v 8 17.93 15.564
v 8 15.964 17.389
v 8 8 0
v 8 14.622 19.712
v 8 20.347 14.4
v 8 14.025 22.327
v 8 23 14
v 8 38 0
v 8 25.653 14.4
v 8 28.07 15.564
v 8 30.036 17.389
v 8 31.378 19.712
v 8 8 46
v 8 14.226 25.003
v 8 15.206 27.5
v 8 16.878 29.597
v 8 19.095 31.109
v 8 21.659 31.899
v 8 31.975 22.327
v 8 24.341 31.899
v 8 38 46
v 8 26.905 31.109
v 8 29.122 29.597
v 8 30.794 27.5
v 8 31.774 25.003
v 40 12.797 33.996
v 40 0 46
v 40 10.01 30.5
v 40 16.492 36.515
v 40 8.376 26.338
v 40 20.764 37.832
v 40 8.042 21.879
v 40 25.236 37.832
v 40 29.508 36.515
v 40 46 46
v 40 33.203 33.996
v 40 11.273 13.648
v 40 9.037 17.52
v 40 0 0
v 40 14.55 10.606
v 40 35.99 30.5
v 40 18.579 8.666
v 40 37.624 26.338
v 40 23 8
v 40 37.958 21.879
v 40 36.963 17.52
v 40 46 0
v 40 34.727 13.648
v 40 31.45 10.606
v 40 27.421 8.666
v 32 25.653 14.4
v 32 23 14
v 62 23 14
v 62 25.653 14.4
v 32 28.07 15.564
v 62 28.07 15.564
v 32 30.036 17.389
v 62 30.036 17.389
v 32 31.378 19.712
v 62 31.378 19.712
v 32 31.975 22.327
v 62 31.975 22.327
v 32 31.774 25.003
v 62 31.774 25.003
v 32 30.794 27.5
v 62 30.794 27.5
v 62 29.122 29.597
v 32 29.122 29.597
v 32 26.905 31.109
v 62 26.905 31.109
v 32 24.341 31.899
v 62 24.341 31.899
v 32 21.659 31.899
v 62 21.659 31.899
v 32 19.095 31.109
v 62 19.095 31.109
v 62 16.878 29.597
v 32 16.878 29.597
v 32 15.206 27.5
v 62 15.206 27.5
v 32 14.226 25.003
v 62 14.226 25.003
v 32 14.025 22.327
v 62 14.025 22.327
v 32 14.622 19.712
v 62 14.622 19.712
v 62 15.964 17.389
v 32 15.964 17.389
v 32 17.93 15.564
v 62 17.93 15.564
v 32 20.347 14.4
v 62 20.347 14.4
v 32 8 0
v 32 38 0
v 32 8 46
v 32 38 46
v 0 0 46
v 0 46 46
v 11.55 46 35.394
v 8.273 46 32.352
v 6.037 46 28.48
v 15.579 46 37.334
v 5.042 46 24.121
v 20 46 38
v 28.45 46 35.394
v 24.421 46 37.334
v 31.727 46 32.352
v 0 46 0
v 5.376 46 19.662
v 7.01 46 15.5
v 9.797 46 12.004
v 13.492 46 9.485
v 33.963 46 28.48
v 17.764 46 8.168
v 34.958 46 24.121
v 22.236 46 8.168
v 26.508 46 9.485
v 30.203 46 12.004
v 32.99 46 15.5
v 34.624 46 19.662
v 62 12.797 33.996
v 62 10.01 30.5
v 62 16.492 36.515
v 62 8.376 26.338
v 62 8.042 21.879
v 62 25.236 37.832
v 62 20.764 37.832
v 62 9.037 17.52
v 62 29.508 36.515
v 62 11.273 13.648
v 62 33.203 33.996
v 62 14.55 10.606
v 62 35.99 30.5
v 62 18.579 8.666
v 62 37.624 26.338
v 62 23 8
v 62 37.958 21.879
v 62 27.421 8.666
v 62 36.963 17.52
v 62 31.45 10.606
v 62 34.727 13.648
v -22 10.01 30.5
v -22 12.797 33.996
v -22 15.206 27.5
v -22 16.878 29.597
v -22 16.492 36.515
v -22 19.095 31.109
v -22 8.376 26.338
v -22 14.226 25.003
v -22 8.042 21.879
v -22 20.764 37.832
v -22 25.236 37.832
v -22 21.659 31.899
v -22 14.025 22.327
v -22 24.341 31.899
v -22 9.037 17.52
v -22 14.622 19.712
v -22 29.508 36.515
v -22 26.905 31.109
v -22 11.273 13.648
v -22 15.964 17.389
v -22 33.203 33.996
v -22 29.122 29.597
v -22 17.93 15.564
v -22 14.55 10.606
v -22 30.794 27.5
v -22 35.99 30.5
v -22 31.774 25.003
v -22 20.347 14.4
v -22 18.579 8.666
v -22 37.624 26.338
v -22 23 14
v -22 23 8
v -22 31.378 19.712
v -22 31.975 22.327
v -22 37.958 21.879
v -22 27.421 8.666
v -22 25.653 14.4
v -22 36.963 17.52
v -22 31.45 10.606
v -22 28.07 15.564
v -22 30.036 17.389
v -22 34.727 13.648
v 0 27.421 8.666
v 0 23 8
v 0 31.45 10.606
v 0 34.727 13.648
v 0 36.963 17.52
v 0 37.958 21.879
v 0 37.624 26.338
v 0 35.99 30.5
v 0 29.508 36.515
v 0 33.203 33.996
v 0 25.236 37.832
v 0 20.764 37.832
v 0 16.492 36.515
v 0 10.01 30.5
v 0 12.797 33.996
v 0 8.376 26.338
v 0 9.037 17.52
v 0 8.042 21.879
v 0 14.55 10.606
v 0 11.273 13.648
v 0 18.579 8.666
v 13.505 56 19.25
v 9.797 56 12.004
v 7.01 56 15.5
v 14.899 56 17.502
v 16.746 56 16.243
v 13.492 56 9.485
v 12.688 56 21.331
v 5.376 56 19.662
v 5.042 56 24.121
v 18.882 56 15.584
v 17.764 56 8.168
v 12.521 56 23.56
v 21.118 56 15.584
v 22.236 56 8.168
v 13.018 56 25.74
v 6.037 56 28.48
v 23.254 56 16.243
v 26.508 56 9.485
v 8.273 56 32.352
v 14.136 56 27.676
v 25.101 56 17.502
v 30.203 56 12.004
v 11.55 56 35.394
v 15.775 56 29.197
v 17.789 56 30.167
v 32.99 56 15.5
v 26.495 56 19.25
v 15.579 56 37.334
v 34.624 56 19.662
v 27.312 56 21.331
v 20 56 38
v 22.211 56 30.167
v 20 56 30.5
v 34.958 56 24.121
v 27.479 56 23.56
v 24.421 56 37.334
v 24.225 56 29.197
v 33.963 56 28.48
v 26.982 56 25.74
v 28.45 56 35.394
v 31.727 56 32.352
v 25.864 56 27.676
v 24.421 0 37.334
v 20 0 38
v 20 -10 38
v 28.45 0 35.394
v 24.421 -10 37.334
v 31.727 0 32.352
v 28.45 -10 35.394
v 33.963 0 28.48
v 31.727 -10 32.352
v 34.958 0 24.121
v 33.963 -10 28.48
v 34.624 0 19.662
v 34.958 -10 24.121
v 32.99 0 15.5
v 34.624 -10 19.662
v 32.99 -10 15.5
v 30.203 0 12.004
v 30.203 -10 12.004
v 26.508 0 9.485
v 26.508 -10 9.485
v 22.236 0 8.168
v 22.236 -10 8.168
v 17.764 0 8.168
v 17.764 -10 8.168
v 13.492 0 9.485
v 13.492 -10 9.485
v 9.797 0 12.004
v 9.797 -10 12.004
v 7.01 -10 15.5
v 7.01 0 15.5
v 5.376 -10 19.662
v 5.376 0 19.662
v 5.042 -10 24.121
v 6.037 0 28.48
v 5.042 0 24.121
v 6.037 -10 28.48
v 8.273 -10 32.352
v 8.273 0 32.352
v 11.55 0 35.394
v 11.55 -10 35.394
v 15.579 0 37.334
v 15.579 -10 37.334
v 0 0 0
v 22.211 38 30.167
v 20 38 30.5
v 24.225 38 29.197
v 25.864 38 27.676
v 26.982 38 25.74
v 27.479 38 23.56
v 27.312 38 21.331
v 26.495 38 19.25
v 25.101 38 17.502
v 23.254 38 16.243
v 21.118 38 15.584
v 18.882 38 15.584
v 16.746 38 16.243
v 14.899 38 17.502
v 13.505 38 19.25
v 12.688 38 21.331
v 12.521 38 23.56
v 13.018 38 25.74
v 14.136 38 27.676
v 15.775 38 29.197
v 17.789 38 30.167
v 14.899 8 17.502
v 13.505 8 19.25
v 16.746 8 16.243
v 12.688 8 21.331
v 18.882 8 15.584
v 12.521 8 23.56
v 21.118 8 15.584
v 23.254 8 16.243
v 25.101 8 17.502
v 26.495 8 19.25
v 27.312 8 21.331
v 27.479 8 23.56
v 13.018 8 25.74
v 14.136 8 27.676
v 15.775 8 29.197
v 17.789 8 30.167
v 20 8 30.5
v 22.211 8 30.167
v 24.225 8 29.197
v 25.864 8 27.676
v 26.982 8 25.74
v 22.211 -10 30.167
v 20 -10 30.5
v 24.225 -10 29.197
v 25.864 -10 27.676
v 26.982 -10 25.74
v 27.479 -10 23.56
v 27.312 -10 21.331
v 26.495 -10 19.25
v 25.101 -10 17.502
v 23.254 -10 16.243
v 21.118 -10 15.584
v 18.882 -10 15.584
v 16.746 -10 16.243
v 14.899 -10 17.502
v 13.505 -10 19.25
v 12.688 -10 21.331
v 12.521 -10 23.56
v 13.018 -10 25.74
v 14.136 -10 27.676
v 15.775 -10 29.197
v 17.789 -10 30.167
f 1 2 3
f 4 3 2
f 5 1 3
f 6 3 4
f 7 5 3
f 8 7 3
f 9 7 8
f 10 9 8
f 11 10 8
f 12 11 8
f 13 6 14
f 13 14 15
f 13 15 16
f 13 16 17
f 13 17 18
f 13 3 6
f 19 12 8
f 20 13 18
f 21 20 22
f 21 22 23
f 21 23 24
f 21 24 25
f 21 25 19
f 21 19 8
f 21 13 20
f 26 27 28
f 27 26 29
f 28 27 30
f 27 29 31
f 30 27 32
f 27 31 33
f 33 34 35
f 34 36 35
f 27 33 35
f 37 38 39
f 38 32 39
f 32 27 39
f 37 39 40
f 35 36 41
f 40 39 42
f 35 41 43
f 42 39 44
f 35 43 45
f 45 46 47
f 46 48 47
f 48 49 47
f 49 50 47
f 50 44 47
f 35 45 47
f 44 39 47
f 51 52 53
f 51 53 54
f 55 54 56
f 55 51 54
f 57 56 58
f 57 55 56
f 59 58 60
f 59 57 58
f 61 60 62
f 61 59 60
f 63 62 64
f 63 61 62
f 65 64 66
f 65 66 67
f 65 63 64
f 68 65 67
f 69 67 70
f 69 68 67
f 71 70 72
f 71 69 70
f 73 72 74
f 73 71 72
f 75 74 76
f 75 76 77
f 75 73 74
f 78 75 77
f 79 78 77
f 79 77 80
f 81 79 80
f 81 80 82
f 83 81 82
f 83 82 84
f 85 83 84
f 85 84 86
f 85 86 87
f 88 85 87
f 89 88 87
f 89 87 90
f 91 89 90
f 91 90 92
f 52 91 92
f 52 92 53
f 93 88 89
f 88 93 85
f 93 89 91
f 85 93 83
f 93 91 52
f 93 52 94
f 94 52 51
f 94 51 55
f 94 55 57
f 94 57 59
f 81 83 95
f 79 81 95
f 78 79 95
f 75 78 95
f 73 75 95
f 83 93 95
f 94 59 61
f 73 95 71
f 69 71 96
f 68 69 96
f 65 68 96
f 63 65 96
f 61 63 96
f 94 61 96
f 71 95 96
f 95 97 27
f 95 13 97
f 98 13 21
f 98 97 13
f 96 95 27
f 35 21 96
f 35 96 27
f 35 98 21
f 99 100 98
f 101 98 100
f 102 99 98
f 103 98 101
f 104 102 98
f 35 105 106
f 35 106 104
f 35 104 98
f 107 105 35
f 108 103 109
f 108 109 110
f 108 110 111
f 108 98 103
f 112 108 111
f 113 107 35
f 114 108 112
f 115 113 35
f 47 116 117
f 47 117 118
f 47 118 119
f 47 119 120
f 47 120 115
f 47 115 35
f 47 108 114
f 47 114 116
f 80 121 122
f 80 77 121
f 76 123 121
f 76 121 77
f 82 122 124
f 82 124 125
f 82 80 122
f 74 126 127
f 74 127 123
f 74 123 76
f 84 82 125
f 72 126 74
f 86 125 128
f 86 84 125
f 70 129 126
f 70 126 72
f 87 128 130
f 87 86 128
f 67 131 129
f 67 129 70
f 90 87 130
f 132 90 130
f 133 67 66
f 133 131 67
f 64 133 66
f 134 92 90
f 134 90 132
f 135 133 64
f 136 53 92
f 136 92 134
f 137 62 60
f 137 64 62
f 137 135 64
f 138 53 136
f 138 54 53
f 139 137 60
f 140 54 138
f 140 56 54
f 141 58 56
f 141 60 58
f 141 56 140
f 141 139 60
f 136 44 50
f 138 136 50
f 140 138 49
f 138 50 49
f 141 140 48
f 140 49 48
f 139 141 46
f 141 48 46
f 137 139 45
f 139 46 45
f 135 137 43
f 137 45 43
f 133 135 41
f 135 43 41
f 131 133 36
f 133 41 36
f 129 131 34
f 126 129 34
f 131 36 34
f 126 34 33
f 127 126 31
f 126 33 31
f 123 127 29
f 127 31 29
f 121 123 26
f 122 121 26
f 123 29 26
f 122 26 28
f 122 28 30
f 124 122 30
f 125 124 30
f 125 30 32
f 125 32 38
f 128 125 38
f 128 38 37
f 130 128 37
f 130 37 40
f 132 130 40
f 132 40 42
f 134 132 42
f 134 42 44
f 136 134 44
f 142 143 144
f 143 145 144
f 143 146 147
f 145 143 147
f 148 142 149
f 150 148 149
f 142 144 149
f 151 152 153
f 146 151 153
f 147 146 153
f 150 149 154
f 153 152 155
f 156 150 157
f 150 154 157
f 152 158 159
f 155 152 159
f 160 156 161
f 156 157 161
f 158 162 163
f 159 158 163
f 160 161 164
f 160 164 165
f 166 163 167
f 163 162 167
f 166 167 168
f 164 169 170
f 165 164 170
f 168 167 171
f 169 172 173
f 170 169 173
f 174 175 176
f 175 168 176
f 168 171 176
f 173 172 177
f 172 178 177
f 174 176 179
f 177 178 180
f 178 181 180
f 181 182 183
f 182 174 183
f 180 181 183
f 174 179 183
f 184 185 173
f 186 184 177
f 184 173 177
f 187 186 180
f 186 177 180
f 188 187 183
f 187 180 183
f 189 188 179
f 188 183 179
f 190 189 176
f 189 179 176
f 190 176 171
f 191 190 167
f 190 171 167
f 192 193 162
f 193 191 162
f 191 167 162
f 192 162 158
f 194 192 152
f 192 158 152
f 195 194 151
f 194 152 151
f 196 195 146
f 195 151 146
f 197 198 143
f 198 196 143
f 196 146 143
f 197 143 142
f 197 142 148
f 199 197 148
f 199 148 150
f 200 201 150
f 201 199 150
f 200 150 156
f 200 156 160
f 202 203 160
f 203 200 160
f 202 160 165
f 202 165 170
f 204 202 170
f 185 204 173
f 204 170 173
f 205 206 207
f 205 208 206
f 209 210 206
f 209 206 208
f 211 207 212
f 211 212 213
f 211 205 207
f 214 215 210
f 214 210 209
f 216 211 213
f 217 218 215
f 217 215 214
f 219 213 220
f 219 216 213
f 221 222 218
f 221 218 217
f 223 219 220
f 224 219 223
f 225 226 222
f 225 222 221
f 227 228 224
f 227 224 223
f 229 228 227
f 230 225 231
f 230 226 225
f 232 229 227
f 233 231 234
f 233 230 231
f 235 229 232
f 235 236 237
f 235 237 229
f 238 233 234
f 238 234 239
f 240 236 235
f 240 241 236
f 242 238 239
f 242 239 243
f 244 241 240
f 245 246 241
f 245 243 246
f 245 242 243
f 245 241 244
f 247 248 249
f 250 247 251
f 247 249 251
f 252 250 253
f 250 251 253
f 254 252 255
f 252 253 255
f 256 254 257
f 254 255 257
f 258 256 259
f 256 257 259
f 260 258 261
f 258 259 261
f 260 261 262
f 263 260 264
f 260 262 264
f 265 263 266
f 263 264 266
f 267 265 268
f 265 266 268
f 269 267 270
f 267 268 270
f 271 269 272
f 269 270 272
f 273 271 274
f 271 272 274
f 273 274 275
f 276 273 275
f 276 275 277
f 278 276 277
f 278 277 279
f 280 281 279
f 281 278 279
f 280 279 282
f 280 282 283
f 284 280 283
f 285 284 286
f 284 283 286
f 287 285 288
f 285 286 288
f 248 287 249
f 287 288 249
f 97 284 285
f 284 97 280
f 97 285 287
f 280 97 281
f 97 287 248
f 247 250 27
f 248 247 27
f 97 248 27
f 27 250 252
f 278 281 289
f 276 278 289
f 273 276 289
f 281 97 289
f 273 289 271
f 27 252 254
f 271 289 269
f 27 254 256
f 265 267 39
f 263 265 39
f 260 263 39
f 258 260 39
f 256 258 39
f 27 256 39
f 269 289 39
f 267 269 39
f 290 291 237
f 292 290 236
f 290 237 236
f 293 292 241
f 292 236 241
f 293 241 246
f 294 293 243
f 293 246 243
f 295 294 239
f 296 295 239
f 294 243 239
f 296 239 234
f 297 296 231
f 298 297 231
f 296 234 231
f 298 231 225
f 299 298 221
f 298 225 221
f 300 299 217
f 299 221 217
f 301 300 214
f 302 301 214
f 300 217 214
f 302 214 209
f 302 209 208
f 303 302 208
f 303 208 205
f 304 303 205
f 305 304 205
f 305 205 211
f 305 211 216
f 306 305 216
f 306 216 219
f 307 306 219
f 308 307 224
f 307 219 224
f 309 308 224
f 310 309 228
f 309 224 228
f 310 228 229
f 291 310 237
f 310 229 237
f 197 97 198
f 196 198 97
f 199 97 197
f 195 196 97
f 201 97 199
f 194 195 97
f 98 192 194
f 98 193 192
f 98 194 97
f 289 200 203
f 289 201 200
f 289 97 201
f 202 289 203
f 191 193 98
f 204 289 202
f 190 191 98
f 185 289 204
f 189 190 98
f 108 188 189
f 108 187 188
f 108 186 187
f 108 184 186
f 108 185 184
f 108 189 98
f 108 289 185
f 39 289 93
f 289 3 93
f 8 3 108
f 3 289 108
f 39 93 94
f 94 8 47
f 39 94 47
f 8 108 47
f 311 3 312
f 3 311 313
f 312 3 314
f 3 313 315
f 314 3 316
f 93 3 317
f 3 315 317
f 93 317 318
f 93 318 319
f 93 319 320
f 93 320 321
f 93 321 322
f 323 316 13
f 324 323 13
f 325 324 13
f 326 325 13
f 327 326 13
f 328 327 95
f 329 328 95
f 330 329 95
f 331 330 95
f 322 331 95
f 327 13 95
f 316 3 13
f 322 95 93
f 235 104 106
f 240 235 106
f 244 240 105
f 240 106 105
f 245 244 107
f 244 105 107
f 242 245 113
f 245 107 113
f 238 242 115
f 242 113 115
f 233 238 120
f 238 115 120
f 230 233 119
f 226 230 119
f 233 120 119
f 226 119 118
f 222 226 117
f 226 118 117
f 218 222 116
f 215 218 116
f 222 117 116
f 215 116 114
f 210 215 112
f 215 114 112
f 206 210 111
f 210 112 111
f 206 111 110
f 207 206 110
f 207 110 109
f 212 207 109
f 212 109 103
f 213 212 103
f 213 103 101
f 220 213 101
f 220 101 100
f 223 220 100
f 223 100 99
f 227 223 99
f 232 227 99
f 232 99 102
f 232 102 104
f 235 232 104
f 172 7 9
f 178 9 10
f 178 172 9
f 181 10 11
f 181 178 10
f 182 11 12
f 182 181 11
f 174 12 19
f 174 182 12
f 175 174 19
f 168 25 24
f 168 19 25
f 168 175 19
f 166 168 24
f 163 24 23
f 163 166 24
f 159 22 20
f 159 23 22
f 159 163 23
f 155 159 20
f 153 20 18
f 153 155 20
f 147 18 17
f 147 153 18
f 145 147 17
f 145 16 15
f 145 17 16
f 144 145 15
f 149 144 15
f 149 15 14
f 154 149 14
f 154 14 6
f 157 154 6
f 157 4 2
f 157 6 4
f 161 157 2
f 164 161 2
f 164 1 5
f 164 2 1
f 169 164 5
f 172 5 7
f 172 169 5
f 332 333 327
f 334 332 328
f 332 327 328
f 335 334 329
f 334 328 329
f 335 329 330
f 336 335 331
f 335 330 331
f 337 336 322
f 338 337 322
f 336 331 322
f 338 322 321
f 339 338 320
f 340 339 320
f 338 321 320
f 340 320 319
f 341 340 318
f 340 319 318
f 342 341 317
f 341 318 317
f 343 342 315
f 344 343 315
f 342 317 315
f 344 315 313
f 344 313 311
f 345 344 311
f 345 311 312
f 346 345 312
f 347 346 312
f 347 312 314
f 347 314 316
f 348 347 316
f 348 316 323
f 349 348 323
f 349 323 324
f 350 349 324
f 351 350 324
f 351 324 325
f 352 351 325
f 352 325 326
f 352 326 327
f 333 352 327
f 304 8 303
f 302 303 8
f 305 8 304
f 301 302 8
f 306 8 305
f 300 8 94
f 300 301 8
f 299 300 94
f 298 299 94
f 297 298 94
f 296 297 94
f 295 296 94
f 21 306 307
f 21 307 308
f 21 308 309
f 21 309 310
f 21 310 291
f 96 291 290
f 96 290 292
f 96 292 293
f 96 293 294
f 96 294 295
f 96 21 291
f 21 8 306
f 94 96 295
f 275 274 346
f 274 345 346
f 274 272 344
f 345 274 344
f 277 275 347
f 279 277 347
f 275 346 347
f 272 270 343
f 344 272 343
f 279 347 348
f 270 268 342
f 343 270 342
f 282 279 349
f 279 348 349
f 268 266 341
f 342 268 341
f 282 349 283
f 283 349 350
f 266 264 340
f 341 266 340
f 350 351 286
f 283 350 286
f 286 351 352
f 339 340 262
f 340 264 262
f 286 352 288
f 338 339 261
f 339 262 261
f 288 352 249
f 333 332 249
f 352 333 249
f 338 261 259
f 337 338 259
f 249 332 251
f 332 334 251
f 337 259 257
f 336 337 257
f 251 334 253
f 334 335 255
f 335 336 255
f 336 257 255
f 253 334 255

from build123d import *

# Parameters (mm, degrees)
SKETCH1_W                = 40
SKETCH1_H                = 46
BOSS_EXTRUDE1_DEPTH      = 46
BOSS_EXTRUDE2_DEPTH      = 10
BOSS_EXTRUDE2_DEPTH_BACK = 56
SKETCH2_R                = 15
SKETCH2_R_2              = 7.5
BOSS_EXTRUDE3_DEPTH      = 22
BOSS_EXTRUDE3_DEPTH_BACK = 62
SKETCH3_R                = 15
SKETCH3_R_2              = 9
SKETCH4_R                = 9
CUT_EXTRUDE1_DEPTH       = 130
SKETCH5_R                = 7.5
CUT_EXTRUDE2_DEPTH       = 130
SKETCH6_W                = 24
SKETCH6_H                = 30
CUT_EXTRUDE3_DEPTH       = 130


with BuildPart() as part:
    # Sketch1 → Boss-Extrude1 (new body)
    with BuildSketch(Plane.XY):
        with Locations((20, 23)):
            Rectangle(SKETCH1_W, SKETCH1_H)
    extrude(amount=BOSS_EXTRUDE1_DEPTH)

    # Sketch2 → Boss-Extrude2 (add, two sides: drawn at the far end of the back side and taken through both)
    with BuildSketch(Plane(origin=(0, 46, 0), x_dir=(1, 0, 0), z_dir=(0, 1, 0)).offset(-BOSS_EXTRUDE2_DEPTH_BACK)):
        with Locations(Location((20, -23, 0), (0, 0, 270))):
            Circle(SKETCH2_R)
        with Locations(Location((20, -23, 0), (0, 0, 270))):
            Circle(SKETCH2_R_2, mode=Mode.SUBTRACT)
    extrude(amount=BOSS_EXTRUDE2_DEPTH + BOSS_EXTRUDE2_DEPTH_BACK)

    # Sketch3 → Boss-Extrude3 (add, two sides: drawn at the far end of the back side and taken through both)
    with BuildSketch(Plane(origin=(40, 0, 0), x_dir=(0, 0, -1), z_dir=(1, 0, 0)).offset(-BOSS_EXTRUDE3_DEPTH_BACK)):
        with Locations((-23, 23)):
            Circle(SKETCH3_R)
        with Locations((-23, 23)):
            Circle(SKETCH3_R_2, mode=Mode.SUBTRACT)
    extrude(amount=BOSS_EXTRUDE3_DEPTH + BOSS_EXTRUDE3_DEPTH_BACK)

    # Sketch4 → Cut-Extrude1 (cut)
    with BuildSketch(Plane(origin=(40, 0, 0), x_dir=(0, 0, -1), z_dir=(1, 0, 0))):
        with Locations((-23, 23)):
            Circle(SKETCH4_R)
    extrude(amount=-CUT_EXTRUDE1_DEPTH, mode=Mode.SUBTRACT)

    # Sketch5 → Cut-Extrude2 (cut)
    with BuildSketch(Plane(origin=(0, 46, 0), x_dir=(1, 0, 0), z_dir=(0, 1, 0))):
        with Locations(Location((20, -23, 0), (0, 0, 270))):
            Circle(SKETCH5_R)
    extrude(amount=-CUT_EXTRUDE2_DEPTH, mode=Mode.SUBTRACT)

    # Sketch6 → Cut-Extrude3 (cut)
    with BuildSketch(Plane.XY.offset(46)):
        with Locations((20, 23)):
            Rectangle(SKETCH6_W, SKETCH6_H)
    extrude(amount=-CUT_EXTRUDE3_DEPTH, mode=Mode.SUBTRACT)


solid = part.part
